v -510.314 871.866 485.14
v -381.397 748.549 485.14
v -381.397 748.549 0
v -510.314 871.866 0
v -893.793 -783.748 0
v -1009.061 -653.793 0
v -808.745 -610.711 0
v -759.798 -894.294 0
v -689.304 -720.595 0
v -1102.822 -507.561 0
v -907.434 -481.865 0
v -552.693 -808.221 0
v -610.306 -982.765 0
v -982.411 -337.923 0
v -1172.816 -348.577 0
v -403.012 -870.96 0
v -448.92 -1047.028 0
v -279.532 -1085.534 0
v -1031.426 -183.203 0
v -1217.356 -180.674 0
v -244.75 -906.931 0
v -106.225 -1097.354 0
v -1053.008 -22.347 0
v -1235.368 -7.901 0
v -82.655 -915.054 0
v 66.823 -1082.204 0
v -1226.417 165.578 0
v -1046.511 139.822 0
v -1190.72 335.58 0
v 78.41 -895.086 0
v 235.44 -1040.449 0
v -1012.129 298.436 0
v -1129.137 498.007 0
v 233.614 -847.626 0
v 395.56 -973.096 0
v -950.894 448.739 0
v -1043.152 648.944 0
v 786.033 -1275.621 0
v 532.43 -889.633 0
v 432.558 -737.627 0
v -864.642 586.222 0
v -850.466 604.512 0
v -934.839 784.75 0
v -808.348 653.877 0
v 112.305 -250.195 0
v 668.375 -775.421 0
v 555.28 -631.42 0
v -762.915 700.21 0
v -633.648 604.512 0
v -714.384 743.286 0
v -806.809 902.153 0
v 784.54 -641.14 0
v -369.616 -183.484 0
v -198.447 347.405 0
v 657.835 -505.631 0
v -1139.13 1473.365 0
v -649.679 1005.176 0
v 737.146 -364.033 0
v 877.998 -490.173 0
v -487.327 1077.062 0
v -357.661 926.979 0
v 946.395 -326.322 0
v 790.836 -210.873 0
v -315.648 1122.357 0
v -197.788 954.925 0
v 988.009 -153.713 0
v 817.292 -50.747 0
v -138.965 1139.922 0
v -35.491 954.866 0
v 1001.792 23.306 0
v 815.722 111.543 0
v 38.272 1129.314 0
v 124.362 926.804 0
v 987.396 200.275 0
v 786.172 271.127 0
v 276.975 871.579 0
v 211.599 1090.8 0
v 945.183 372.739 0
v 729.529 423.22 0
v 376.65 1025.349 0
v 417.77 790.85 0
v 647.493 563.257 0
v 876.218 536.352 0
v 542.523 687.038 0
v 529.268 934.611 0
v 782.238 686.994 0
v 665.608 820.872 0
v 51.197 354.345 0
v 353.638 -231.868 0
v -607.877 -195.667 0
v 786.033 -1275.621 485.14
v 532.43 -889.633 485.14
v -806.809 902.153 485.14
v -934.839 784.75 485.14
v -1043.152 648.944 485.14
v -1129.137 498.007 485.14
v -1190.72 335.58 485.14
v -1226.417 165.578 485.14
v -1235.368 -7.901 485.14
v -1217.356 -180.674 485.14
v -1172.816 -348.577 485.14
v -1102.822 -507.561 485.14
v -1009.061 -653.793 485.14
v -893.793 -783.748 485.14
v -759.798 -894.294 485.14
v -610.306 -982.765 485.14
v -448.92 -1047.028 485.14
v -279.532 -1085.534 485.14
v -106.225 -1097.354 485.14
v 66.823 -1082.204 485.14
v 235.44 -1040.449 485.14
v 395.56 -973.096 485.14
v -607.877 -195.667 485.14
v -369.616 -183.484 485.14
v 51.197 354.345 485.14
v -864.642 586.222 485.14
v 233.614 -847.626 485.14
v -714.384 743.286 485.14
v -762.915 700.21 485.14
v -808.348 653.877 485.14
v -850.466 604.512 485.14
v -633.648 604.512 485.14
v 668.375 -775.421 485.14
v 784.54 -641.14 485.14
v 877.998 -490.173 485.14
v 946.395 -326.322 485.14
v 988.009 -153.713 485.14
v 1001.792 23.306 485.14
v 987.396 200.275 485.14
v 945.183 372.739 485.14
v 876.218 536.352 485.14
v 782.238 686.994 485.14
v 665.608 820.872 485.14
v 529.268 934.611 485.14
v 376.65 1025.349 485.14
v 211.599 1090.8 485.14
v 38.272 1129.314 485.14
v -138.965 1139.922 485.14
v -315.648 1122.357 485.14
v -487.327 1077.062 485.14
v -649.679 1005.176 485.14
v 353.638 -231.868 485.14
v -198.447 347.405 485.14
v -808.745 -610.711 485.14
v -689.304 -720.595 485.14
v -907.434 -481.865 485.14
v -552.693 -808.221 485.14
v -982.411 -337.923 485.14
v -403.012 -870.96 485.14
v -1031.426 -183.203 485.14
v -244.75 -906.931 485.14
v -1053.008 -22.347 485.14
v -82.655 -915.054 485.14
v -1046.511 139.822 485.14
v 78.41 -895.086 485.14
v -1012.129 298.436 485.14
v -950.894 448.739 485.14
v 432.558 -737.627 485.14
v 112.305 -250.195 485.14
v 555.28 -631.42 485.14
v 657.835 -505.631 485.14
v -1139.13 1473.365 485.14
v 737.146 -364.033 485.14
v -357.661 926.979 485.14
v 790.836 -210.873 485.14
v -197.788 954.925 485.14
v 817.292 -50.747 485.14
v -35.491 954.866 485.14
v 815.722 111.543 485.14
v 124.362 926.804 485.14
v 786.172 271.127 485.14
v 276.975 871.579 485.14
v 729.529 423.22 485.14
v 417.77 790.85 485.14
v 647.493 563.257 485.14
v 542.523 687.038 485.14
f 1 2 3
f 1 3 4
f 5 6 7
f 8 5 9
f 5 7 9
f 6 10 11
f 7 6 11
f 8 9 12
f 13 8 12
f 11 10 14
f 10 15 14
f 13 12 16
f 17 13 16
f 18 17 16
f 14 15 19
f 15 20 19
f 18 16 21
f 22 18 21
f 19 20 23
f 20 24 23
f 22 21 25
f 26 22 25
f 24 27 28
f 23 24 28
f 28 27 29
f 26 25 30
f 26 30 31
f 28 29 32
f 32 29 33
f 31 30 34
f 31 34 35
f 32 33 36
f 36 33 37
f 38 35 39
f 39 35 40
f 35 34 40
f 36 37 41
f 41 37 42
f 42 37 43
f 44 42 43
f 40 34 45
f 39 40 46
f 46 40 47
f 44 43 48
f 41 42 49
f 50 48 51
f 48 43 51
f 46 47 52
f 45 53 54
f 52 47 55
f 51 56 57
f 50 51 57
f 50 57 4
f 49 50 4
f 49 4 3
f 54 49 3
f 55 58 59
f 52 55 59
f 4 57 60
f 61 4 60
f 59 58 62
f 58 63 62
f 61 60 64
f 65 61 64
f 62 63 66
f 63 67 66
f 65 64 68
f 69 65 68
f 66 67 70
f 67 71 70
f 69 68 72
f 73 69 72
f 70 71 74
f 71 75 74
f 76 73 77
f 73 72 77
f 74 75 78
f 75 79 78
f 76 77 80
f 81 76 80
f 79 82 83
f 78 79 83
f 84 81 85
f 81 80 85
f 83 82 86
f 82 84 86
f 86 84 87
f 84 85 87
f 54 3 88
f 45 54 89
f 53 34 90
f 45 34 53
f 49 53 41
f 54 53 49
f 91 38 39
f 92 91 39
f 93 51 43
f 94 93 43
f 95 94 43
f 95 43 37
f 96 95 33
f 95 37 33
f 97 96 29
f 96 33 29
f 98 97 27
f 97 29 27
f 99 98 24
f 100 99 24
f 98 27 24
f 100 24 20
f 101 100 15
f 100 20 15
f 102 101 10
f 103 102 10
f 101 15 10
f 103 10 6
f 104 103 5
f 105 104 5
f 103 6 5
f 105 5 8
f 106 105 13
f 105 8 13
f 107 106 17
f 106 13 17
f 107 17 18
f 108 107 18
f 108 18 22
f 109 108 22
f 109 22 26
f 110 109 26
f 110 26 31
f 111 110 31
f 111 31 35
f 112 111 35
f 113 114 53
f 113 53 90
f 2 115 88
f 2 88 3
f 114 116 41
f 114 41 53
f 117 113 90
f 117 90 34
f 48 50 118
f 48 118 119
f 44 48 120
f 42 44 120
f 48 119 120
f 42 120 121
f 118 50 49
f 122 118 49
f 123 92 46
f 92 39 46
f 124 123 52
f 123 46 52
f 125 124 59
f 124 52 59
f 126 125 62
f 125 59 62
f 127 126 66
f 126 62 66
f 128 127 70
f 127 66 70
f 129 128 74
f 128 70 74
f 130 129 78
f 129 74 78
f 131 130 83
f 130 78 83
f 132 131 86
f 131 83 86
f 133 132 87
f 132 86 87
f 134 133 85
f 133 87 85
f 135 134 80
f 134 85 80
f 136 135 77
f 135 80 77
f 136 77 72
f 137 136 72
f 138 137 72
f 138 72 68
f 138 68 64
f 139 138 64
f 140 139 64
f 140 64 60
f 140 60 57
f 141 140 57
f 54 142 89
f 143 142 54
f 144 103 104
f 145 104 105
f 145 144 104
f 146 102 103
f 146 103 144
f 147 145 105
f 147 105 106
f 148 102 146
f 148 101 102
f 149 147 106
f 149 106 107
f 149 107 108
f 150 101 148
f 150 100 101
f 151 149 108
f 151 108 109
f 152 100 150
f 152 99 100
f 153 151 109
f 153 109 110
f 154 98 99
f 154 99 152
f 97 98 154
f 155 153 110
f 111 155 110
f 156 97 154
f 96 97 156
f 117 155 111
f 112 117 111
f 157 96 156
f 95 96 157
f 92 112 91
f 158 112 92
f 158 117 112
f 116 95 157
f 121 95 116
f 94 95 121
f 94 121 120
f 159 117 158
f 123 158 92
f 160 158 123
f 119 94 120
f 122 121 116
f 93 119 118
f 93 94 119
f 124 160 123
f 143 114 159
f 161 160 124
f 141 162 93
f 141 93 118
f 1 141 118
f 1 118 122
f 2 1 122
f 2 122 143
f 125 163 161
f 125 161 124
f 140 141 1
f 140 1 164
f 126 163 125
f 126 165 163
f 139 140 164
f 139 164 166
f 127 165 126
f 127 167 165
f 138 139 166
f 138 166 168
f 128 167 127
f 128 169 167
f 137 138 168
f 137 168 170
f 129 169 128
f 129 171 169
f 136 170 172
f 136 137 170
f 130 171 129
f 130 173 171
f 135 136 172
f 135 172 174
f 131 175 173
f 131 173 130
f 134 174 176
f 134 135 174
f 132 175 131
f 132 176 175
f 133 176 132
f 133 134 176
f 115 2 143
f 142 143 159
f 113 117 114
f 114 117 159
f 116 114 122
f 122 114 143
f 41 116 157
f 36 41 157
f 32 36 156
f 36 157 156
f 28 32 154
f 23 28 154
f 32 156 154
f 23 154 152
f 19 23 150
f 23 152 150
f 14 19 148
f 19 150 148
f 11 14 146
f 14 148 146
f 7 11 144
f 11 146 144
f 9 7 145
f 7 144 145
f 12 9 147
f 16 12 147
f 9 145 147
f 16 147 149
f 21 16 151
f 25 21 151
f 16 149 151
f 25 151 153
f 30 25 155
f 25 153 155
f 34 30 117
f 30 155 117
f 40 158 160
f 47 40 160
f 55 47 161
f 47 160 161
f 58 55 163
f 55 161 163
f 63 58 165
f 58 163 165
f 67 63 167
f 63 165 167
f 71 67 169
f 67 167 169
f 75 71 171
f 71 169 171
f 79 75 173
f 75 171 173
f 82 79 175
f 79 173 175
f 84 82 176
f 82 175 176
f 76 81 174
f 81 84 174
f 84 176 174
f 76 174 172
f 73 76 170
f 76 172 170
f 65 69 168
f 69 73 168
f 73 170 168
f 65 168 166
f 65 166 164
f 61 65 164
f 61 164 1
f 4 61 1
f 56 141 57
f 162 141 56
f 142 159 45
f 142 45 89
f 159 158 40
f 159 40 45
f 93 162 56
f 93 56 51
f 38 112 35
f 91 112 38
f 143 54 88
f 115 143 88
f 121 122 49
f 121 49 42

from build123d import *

# Parameters (mm, degrees)
F0_R     = 1118.772052
F1_DEPTH = 485.14
F2_R     = 937.049597
F3_DEPTH = 485.141
F5_DEPTH = 485.14


with BuildPart() as f1:
    # F0 (on Top) → F1 (new body)
    with BuildSketch(Plane.XY):
        with Locations((-116.978705, 21.36628)):
            Circle(F0_R)
    extrude(amount=F1_DEPTH)

    # F2 (on face) → F3 (cut, through all)
    with BuildSketch(Plane.XY.offset(485.14)):
        with Locations((-116.978705, 21.36628)):
            Circle(F2_R)
    extrude(amount=-F3_DEPTH, mode=Mode.SUBTRACT)

    # F4 (on face) → F5 (join)
    with BuildSketch(Plane.XY.offset(485.14)):
        Polygon((-381.39686, 748.548687), (-1139.129914, 1473.365228), (-633.64774, 604.511797), (-876.405072, 604.511797), (-369.615673, -183.483621), (-607.877022, -195.666996), (786.032647, -1275.620681), (112.30468, -250.195295), (353.638202, -231.867895), (-198.447272, 347.404599), (51.197376, 354.344636), align=None)
    extrude(amount=-F5_DEPTH)


solid = f1.part
